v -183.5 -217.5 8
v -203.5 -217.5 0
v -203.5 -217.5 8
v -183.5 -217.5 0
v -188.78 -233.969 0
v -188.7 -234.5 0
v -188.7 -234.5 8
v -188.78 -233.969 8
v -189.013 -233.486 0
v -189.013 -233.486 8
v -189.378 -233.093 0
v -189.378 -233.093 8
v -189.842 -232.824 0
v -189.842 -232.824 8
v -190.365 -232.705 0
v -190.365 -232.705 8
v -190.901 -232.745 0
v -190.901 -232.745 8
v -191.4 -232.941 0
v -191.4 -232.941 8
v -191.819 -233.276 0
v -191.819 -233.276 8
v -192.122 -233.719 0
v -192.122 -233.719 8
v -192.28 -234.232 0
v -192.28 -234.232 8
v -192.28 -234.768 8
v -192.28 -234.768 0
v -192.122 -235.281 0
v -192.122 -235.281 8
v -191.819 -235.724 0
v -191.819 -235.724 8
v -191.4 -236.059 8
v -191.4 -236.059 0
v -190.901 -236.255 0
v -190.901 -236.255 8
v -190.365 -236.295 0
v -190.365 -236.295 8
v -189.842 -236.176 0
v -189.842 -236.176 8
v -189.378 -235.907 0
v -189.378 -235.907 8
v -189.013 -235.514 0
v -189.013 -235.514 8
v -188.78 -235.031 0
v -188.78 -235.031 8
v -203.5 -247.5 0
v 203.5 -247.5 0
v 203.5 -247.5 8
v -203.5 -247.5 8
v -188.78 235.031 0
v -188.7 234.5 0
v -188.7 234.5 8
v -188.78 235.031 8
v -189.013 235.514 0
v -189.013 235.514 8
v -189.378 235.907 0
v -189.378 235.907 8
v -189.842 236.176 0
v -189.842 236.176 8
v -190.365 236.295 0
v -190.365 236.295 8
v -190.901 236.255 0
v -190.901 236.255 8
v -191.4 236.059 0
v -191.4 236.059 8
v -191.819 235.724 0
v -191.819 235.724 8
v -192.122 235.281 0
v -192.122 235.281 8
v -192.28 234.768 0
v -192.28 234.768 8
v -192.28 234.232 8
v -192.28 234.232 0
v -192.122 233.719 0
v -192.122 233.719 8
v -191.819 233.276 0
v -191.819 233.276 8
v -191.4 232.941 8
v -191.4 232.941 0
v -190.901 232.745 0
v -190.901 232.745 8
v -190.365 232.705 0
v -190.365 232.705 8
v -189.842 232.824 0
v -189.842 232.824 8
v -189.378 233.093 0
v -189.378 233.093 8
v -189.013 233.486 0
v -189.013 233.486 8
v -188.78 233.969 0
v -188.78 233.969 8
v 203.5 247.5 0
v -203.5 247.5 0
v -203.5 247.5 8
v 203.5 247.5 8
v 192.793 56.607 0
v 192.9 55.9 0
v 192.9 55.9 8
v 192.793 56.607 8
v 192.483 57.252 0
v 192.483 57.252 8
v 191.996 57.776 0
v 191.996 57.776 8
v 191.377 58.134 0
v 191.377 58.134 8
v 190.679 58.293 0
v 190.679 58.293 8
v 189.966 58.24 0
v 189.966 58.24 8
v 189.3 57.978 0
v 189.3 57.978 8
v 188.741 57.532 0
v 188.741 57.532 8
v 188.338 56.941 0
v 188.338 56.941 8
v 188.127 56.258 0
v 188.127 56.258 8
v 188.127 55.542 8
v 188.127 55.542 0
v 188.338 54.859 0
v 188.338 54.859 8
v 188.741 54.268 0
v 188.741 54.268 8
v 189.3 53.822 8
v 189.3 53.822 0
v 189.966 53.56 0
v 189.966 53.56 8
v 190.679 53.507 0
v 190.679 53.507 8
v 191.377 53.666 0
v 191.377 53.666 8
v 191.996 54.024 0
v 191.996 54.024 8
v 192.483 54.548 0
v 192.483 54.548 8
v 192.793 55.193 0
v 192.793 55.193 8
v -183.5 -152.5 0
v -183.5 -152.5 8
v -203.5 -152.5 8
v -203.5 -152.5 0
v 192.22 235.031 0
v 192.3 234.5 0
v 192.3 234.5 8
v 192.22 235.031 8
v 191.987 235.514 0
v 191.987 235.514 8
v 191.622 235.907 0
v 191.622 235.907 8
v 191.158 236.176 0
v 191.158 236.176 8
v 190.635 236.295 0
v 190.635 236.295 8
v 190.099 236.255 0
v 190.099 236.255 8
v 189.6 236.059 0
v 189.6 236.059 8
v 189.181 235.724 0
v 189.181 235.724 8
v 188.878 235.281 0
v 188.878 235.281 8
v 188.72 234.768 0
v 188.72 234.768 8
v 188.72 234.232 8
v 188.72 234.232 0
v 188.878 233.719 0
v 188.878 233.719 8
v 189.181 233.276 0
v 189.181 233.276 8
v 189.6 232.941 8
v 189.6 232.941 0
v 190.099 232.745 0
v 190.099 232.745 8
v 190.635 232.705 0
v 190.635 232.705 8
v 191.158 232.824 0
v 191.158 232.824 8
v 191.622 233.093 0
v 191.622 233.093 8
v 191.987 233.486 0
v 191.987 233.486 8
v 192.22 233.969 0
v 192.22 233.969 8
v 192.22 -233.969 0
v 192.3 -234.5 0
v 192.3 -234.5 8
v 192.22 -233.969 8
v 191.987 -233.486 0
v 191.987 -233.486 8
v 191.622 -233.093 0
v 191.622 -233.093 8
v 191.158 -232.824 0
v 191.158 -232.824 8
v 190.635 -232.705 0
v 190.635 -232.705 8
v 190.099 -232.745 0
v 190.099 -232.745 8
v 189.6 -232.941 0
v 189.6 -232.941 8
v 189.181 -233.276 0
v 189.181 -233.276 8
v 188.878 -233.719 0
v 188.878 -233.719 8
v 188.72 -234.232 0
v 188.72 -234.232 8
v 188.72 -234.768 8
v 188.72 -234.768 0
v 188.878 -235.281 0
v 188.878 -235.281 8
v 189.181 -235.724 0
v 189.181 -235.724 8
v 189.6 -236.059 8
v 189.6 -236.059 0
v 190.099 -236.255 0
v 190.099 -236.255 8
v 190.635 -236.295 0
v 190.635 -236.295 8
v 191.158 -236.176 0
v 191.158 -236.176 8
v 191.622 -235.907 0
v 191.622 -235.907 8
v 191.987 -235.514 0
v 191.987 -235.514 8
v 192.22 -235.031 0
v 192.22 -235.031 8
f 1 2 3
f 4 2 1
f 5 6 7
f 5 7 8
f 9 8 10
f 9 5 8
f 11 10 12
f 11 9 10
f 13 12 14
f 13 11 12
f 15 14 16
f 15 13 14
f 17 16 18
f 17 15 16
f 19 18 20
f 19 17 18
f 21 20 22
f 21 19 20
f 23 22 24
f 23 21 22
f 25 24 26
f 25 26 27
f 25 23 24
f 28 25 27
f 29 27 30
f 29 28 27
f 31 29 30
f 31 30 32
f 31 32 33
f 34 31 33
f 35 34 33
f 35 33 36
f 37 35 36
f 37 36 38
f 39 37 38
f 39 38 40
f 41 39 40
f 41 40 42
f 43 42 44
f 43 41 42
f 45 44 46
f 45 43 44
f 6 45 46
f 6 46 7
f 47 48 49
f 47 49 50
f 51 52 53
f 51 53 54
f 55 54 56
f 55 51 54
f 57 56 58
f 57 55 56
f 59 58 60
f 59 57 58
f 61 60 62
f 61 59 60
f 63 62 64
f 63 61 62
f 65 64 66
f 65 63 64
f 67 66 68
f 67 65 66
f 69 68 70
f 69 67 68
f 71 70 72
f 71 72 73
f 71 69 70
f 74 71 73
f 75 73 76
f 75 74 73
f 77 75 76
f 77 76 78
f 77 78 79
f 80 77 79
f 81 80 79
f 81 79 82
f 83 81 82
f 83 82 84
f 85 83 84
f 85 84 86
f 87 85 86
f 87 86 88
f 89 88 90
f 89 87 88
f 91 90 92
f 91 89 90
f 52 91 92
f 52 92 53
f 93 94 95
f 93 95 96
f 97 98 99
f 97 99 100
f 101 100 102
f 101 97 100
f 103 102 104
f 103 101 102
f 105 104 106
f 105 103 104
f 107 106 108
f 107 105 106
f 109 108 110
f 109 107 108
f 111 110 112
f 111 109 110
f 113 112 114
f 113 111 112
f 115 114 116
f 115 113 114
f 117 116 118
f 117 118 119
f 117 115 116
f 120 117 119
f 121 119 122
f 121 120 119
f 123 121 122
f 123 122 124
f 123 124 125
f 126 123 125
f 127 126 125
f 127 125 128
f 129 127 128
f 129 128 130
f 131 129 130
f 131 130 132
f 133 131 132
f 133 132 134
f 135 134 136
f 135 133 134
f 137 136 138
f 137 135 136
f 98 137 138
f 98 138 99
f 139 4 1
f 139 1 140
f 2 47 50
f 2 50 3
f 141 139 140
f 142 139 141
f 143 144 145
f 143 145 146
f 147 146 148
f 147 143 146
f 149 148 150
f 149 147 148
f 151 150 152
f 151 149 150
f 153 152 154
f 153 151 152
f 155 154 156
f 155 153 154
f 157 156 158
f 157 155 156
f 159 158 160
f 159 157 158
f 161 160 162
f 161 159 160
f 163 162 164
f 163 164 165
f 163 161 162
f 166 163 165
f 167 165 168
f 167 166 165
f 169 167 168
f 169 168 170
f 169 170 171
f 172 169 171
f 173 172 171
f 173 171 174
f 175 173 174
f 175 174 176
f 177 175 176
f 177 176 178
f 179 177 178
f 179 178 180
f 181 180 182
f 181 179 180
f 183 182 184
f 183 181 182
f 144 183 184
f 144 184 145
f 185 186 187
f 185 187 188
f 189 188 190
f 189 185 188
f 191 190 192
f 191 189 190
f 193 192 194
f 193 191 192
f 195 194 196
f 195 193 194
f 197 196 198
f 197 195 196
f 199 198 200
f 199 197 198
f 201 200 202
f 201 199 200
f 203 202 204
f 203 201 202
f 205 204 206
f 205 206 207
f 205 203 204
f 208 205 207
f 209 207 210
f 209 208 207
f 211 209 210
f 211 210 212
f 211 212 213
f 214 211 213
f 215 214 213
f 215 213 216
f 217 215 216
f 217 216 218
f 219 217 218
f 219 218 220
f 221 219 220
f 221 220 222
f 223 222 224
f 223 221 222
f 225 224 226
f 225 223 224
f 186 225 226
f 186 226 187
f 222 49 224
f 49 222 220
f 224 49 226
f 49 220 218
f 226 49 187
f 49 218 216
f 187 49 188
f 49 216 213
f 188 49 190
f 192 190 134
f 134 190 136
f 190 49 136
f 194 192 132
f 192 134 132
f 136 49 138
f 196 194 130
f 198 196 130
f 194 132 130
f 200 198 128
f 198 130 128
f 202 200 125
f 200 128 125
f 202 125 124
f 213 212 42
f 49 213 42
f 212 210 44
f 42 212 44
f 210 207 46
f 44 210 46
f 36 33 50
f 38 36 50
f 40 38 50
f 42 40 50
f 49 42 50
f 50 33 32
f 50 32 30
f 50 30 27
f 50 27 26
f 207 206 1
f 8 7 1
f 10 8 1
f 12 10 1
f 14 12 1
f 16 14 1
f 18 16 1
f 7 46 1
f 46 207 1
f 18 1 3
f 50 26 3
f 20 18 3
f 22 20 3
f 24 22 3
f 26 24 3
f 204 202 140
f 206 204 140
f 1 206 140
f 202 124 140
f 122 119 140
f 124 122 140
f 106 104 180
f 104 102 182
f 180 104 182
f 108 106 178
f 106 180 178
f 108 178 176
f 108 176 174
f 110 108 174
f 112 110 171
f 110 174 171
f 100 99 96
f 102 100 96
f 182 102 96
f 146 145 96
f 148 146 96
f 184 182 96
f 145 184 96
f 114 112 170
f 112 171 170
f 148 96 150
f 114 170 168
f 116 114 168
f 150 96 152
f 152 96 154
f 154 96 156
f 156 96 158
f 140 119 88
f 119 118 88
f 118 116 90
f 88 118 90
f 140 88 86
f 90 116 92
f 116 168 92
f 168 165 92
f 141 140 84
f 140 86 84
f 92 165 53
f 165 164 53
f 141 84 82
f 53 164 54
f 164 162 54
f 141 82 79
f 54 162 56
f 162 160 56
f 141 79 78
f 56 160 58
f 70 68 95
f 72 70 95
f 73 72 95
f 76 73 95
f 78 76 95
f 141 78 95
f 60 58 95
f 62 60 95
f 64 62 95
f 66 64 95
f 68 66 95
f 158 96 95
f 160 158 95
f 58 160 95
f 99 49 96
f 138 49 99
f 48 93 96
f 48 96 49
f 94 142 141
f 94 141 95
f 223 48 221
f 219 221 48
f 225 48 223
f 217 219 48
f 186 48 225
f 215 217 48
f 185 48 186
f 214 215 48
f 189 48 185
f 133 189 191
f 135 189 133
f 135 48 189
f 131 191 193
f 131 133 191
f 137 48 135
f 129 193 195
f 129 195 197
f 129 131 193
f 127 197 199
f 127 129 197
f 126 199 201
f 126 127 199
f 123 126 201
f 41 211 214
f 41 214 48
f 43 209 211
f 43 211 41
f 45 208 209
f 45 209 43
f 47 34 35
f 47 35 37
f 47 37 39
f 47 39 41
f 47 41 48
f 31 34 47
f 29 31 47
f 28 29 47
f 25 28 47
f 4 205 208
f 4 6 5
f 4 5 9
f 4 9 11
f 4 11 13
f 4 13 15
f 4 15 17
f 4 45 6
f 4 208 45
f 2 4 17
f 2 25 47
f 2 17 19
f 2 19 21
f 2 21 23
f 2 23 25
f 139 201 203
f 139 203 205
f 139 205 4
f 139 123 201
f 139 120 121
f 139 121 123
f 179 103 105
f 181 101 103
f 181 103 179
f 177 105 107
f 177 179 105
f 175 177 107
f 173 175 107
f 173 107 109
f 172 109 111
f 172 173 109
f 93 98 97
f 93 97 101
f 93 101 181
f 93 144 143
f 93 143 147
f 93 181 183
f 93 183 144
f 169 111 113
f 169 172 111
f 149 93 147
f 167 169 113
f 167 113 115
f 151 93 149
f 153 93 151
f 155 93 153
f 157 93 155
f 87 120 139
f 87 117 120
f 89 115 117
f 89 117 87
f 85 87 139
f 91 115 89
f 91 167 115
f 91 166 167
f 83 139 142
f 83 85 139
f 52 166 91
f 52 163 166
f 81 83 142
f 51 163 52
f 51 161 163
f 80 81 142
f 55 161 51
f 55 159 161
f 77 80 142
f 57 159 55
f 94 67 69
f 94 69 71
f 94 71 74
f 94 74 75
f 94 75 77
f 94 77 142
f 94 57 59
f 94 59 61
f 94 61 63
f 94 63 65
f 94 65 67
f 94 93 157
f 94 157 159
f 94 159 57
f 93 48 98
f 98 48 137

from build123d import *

# Parameters (mm, degrees)
SKETCH_R   = 1.8
SKETCH_R_2 = 2.4
PAD_DEPTH  = 8


with BuildPart() as part:
    # Sketch → Pad (new body)
    with BuildSketch(Plane.XY):
        Polygon((-203.5, 247.5), (203.5, 247.5), (203.5, -247.5), (-203.5, -247.5), (-203.5, -217.5), (-183.5, -217.5), (-183.5, -152.5), (-203.5, -152.5), align=None)
        with Locations((-190.5, 234.5)):
            Circle(SKETCH_R, mode=Mode.SUBTRACT)
        with Locations((190.5, 234.5)):
            Circle(SKETCH_R, mode=Mode.SUBTRACT)
        with Locations((-190.5, -234.5)):
            Circle(SKETCH_R, mode=Mode.SUBTRACT)
        with Locations((190.5, -234.5)):
            Circle(SKETCH_R, mode=Mode.SUBTRACT)
        with Locations((190.5, 55.9)):
            Circle(SKETCH_R_2, mode=Mode.SUBTRACT)
    extrude(amount=PAD_DEPTH)


solid = part.part
